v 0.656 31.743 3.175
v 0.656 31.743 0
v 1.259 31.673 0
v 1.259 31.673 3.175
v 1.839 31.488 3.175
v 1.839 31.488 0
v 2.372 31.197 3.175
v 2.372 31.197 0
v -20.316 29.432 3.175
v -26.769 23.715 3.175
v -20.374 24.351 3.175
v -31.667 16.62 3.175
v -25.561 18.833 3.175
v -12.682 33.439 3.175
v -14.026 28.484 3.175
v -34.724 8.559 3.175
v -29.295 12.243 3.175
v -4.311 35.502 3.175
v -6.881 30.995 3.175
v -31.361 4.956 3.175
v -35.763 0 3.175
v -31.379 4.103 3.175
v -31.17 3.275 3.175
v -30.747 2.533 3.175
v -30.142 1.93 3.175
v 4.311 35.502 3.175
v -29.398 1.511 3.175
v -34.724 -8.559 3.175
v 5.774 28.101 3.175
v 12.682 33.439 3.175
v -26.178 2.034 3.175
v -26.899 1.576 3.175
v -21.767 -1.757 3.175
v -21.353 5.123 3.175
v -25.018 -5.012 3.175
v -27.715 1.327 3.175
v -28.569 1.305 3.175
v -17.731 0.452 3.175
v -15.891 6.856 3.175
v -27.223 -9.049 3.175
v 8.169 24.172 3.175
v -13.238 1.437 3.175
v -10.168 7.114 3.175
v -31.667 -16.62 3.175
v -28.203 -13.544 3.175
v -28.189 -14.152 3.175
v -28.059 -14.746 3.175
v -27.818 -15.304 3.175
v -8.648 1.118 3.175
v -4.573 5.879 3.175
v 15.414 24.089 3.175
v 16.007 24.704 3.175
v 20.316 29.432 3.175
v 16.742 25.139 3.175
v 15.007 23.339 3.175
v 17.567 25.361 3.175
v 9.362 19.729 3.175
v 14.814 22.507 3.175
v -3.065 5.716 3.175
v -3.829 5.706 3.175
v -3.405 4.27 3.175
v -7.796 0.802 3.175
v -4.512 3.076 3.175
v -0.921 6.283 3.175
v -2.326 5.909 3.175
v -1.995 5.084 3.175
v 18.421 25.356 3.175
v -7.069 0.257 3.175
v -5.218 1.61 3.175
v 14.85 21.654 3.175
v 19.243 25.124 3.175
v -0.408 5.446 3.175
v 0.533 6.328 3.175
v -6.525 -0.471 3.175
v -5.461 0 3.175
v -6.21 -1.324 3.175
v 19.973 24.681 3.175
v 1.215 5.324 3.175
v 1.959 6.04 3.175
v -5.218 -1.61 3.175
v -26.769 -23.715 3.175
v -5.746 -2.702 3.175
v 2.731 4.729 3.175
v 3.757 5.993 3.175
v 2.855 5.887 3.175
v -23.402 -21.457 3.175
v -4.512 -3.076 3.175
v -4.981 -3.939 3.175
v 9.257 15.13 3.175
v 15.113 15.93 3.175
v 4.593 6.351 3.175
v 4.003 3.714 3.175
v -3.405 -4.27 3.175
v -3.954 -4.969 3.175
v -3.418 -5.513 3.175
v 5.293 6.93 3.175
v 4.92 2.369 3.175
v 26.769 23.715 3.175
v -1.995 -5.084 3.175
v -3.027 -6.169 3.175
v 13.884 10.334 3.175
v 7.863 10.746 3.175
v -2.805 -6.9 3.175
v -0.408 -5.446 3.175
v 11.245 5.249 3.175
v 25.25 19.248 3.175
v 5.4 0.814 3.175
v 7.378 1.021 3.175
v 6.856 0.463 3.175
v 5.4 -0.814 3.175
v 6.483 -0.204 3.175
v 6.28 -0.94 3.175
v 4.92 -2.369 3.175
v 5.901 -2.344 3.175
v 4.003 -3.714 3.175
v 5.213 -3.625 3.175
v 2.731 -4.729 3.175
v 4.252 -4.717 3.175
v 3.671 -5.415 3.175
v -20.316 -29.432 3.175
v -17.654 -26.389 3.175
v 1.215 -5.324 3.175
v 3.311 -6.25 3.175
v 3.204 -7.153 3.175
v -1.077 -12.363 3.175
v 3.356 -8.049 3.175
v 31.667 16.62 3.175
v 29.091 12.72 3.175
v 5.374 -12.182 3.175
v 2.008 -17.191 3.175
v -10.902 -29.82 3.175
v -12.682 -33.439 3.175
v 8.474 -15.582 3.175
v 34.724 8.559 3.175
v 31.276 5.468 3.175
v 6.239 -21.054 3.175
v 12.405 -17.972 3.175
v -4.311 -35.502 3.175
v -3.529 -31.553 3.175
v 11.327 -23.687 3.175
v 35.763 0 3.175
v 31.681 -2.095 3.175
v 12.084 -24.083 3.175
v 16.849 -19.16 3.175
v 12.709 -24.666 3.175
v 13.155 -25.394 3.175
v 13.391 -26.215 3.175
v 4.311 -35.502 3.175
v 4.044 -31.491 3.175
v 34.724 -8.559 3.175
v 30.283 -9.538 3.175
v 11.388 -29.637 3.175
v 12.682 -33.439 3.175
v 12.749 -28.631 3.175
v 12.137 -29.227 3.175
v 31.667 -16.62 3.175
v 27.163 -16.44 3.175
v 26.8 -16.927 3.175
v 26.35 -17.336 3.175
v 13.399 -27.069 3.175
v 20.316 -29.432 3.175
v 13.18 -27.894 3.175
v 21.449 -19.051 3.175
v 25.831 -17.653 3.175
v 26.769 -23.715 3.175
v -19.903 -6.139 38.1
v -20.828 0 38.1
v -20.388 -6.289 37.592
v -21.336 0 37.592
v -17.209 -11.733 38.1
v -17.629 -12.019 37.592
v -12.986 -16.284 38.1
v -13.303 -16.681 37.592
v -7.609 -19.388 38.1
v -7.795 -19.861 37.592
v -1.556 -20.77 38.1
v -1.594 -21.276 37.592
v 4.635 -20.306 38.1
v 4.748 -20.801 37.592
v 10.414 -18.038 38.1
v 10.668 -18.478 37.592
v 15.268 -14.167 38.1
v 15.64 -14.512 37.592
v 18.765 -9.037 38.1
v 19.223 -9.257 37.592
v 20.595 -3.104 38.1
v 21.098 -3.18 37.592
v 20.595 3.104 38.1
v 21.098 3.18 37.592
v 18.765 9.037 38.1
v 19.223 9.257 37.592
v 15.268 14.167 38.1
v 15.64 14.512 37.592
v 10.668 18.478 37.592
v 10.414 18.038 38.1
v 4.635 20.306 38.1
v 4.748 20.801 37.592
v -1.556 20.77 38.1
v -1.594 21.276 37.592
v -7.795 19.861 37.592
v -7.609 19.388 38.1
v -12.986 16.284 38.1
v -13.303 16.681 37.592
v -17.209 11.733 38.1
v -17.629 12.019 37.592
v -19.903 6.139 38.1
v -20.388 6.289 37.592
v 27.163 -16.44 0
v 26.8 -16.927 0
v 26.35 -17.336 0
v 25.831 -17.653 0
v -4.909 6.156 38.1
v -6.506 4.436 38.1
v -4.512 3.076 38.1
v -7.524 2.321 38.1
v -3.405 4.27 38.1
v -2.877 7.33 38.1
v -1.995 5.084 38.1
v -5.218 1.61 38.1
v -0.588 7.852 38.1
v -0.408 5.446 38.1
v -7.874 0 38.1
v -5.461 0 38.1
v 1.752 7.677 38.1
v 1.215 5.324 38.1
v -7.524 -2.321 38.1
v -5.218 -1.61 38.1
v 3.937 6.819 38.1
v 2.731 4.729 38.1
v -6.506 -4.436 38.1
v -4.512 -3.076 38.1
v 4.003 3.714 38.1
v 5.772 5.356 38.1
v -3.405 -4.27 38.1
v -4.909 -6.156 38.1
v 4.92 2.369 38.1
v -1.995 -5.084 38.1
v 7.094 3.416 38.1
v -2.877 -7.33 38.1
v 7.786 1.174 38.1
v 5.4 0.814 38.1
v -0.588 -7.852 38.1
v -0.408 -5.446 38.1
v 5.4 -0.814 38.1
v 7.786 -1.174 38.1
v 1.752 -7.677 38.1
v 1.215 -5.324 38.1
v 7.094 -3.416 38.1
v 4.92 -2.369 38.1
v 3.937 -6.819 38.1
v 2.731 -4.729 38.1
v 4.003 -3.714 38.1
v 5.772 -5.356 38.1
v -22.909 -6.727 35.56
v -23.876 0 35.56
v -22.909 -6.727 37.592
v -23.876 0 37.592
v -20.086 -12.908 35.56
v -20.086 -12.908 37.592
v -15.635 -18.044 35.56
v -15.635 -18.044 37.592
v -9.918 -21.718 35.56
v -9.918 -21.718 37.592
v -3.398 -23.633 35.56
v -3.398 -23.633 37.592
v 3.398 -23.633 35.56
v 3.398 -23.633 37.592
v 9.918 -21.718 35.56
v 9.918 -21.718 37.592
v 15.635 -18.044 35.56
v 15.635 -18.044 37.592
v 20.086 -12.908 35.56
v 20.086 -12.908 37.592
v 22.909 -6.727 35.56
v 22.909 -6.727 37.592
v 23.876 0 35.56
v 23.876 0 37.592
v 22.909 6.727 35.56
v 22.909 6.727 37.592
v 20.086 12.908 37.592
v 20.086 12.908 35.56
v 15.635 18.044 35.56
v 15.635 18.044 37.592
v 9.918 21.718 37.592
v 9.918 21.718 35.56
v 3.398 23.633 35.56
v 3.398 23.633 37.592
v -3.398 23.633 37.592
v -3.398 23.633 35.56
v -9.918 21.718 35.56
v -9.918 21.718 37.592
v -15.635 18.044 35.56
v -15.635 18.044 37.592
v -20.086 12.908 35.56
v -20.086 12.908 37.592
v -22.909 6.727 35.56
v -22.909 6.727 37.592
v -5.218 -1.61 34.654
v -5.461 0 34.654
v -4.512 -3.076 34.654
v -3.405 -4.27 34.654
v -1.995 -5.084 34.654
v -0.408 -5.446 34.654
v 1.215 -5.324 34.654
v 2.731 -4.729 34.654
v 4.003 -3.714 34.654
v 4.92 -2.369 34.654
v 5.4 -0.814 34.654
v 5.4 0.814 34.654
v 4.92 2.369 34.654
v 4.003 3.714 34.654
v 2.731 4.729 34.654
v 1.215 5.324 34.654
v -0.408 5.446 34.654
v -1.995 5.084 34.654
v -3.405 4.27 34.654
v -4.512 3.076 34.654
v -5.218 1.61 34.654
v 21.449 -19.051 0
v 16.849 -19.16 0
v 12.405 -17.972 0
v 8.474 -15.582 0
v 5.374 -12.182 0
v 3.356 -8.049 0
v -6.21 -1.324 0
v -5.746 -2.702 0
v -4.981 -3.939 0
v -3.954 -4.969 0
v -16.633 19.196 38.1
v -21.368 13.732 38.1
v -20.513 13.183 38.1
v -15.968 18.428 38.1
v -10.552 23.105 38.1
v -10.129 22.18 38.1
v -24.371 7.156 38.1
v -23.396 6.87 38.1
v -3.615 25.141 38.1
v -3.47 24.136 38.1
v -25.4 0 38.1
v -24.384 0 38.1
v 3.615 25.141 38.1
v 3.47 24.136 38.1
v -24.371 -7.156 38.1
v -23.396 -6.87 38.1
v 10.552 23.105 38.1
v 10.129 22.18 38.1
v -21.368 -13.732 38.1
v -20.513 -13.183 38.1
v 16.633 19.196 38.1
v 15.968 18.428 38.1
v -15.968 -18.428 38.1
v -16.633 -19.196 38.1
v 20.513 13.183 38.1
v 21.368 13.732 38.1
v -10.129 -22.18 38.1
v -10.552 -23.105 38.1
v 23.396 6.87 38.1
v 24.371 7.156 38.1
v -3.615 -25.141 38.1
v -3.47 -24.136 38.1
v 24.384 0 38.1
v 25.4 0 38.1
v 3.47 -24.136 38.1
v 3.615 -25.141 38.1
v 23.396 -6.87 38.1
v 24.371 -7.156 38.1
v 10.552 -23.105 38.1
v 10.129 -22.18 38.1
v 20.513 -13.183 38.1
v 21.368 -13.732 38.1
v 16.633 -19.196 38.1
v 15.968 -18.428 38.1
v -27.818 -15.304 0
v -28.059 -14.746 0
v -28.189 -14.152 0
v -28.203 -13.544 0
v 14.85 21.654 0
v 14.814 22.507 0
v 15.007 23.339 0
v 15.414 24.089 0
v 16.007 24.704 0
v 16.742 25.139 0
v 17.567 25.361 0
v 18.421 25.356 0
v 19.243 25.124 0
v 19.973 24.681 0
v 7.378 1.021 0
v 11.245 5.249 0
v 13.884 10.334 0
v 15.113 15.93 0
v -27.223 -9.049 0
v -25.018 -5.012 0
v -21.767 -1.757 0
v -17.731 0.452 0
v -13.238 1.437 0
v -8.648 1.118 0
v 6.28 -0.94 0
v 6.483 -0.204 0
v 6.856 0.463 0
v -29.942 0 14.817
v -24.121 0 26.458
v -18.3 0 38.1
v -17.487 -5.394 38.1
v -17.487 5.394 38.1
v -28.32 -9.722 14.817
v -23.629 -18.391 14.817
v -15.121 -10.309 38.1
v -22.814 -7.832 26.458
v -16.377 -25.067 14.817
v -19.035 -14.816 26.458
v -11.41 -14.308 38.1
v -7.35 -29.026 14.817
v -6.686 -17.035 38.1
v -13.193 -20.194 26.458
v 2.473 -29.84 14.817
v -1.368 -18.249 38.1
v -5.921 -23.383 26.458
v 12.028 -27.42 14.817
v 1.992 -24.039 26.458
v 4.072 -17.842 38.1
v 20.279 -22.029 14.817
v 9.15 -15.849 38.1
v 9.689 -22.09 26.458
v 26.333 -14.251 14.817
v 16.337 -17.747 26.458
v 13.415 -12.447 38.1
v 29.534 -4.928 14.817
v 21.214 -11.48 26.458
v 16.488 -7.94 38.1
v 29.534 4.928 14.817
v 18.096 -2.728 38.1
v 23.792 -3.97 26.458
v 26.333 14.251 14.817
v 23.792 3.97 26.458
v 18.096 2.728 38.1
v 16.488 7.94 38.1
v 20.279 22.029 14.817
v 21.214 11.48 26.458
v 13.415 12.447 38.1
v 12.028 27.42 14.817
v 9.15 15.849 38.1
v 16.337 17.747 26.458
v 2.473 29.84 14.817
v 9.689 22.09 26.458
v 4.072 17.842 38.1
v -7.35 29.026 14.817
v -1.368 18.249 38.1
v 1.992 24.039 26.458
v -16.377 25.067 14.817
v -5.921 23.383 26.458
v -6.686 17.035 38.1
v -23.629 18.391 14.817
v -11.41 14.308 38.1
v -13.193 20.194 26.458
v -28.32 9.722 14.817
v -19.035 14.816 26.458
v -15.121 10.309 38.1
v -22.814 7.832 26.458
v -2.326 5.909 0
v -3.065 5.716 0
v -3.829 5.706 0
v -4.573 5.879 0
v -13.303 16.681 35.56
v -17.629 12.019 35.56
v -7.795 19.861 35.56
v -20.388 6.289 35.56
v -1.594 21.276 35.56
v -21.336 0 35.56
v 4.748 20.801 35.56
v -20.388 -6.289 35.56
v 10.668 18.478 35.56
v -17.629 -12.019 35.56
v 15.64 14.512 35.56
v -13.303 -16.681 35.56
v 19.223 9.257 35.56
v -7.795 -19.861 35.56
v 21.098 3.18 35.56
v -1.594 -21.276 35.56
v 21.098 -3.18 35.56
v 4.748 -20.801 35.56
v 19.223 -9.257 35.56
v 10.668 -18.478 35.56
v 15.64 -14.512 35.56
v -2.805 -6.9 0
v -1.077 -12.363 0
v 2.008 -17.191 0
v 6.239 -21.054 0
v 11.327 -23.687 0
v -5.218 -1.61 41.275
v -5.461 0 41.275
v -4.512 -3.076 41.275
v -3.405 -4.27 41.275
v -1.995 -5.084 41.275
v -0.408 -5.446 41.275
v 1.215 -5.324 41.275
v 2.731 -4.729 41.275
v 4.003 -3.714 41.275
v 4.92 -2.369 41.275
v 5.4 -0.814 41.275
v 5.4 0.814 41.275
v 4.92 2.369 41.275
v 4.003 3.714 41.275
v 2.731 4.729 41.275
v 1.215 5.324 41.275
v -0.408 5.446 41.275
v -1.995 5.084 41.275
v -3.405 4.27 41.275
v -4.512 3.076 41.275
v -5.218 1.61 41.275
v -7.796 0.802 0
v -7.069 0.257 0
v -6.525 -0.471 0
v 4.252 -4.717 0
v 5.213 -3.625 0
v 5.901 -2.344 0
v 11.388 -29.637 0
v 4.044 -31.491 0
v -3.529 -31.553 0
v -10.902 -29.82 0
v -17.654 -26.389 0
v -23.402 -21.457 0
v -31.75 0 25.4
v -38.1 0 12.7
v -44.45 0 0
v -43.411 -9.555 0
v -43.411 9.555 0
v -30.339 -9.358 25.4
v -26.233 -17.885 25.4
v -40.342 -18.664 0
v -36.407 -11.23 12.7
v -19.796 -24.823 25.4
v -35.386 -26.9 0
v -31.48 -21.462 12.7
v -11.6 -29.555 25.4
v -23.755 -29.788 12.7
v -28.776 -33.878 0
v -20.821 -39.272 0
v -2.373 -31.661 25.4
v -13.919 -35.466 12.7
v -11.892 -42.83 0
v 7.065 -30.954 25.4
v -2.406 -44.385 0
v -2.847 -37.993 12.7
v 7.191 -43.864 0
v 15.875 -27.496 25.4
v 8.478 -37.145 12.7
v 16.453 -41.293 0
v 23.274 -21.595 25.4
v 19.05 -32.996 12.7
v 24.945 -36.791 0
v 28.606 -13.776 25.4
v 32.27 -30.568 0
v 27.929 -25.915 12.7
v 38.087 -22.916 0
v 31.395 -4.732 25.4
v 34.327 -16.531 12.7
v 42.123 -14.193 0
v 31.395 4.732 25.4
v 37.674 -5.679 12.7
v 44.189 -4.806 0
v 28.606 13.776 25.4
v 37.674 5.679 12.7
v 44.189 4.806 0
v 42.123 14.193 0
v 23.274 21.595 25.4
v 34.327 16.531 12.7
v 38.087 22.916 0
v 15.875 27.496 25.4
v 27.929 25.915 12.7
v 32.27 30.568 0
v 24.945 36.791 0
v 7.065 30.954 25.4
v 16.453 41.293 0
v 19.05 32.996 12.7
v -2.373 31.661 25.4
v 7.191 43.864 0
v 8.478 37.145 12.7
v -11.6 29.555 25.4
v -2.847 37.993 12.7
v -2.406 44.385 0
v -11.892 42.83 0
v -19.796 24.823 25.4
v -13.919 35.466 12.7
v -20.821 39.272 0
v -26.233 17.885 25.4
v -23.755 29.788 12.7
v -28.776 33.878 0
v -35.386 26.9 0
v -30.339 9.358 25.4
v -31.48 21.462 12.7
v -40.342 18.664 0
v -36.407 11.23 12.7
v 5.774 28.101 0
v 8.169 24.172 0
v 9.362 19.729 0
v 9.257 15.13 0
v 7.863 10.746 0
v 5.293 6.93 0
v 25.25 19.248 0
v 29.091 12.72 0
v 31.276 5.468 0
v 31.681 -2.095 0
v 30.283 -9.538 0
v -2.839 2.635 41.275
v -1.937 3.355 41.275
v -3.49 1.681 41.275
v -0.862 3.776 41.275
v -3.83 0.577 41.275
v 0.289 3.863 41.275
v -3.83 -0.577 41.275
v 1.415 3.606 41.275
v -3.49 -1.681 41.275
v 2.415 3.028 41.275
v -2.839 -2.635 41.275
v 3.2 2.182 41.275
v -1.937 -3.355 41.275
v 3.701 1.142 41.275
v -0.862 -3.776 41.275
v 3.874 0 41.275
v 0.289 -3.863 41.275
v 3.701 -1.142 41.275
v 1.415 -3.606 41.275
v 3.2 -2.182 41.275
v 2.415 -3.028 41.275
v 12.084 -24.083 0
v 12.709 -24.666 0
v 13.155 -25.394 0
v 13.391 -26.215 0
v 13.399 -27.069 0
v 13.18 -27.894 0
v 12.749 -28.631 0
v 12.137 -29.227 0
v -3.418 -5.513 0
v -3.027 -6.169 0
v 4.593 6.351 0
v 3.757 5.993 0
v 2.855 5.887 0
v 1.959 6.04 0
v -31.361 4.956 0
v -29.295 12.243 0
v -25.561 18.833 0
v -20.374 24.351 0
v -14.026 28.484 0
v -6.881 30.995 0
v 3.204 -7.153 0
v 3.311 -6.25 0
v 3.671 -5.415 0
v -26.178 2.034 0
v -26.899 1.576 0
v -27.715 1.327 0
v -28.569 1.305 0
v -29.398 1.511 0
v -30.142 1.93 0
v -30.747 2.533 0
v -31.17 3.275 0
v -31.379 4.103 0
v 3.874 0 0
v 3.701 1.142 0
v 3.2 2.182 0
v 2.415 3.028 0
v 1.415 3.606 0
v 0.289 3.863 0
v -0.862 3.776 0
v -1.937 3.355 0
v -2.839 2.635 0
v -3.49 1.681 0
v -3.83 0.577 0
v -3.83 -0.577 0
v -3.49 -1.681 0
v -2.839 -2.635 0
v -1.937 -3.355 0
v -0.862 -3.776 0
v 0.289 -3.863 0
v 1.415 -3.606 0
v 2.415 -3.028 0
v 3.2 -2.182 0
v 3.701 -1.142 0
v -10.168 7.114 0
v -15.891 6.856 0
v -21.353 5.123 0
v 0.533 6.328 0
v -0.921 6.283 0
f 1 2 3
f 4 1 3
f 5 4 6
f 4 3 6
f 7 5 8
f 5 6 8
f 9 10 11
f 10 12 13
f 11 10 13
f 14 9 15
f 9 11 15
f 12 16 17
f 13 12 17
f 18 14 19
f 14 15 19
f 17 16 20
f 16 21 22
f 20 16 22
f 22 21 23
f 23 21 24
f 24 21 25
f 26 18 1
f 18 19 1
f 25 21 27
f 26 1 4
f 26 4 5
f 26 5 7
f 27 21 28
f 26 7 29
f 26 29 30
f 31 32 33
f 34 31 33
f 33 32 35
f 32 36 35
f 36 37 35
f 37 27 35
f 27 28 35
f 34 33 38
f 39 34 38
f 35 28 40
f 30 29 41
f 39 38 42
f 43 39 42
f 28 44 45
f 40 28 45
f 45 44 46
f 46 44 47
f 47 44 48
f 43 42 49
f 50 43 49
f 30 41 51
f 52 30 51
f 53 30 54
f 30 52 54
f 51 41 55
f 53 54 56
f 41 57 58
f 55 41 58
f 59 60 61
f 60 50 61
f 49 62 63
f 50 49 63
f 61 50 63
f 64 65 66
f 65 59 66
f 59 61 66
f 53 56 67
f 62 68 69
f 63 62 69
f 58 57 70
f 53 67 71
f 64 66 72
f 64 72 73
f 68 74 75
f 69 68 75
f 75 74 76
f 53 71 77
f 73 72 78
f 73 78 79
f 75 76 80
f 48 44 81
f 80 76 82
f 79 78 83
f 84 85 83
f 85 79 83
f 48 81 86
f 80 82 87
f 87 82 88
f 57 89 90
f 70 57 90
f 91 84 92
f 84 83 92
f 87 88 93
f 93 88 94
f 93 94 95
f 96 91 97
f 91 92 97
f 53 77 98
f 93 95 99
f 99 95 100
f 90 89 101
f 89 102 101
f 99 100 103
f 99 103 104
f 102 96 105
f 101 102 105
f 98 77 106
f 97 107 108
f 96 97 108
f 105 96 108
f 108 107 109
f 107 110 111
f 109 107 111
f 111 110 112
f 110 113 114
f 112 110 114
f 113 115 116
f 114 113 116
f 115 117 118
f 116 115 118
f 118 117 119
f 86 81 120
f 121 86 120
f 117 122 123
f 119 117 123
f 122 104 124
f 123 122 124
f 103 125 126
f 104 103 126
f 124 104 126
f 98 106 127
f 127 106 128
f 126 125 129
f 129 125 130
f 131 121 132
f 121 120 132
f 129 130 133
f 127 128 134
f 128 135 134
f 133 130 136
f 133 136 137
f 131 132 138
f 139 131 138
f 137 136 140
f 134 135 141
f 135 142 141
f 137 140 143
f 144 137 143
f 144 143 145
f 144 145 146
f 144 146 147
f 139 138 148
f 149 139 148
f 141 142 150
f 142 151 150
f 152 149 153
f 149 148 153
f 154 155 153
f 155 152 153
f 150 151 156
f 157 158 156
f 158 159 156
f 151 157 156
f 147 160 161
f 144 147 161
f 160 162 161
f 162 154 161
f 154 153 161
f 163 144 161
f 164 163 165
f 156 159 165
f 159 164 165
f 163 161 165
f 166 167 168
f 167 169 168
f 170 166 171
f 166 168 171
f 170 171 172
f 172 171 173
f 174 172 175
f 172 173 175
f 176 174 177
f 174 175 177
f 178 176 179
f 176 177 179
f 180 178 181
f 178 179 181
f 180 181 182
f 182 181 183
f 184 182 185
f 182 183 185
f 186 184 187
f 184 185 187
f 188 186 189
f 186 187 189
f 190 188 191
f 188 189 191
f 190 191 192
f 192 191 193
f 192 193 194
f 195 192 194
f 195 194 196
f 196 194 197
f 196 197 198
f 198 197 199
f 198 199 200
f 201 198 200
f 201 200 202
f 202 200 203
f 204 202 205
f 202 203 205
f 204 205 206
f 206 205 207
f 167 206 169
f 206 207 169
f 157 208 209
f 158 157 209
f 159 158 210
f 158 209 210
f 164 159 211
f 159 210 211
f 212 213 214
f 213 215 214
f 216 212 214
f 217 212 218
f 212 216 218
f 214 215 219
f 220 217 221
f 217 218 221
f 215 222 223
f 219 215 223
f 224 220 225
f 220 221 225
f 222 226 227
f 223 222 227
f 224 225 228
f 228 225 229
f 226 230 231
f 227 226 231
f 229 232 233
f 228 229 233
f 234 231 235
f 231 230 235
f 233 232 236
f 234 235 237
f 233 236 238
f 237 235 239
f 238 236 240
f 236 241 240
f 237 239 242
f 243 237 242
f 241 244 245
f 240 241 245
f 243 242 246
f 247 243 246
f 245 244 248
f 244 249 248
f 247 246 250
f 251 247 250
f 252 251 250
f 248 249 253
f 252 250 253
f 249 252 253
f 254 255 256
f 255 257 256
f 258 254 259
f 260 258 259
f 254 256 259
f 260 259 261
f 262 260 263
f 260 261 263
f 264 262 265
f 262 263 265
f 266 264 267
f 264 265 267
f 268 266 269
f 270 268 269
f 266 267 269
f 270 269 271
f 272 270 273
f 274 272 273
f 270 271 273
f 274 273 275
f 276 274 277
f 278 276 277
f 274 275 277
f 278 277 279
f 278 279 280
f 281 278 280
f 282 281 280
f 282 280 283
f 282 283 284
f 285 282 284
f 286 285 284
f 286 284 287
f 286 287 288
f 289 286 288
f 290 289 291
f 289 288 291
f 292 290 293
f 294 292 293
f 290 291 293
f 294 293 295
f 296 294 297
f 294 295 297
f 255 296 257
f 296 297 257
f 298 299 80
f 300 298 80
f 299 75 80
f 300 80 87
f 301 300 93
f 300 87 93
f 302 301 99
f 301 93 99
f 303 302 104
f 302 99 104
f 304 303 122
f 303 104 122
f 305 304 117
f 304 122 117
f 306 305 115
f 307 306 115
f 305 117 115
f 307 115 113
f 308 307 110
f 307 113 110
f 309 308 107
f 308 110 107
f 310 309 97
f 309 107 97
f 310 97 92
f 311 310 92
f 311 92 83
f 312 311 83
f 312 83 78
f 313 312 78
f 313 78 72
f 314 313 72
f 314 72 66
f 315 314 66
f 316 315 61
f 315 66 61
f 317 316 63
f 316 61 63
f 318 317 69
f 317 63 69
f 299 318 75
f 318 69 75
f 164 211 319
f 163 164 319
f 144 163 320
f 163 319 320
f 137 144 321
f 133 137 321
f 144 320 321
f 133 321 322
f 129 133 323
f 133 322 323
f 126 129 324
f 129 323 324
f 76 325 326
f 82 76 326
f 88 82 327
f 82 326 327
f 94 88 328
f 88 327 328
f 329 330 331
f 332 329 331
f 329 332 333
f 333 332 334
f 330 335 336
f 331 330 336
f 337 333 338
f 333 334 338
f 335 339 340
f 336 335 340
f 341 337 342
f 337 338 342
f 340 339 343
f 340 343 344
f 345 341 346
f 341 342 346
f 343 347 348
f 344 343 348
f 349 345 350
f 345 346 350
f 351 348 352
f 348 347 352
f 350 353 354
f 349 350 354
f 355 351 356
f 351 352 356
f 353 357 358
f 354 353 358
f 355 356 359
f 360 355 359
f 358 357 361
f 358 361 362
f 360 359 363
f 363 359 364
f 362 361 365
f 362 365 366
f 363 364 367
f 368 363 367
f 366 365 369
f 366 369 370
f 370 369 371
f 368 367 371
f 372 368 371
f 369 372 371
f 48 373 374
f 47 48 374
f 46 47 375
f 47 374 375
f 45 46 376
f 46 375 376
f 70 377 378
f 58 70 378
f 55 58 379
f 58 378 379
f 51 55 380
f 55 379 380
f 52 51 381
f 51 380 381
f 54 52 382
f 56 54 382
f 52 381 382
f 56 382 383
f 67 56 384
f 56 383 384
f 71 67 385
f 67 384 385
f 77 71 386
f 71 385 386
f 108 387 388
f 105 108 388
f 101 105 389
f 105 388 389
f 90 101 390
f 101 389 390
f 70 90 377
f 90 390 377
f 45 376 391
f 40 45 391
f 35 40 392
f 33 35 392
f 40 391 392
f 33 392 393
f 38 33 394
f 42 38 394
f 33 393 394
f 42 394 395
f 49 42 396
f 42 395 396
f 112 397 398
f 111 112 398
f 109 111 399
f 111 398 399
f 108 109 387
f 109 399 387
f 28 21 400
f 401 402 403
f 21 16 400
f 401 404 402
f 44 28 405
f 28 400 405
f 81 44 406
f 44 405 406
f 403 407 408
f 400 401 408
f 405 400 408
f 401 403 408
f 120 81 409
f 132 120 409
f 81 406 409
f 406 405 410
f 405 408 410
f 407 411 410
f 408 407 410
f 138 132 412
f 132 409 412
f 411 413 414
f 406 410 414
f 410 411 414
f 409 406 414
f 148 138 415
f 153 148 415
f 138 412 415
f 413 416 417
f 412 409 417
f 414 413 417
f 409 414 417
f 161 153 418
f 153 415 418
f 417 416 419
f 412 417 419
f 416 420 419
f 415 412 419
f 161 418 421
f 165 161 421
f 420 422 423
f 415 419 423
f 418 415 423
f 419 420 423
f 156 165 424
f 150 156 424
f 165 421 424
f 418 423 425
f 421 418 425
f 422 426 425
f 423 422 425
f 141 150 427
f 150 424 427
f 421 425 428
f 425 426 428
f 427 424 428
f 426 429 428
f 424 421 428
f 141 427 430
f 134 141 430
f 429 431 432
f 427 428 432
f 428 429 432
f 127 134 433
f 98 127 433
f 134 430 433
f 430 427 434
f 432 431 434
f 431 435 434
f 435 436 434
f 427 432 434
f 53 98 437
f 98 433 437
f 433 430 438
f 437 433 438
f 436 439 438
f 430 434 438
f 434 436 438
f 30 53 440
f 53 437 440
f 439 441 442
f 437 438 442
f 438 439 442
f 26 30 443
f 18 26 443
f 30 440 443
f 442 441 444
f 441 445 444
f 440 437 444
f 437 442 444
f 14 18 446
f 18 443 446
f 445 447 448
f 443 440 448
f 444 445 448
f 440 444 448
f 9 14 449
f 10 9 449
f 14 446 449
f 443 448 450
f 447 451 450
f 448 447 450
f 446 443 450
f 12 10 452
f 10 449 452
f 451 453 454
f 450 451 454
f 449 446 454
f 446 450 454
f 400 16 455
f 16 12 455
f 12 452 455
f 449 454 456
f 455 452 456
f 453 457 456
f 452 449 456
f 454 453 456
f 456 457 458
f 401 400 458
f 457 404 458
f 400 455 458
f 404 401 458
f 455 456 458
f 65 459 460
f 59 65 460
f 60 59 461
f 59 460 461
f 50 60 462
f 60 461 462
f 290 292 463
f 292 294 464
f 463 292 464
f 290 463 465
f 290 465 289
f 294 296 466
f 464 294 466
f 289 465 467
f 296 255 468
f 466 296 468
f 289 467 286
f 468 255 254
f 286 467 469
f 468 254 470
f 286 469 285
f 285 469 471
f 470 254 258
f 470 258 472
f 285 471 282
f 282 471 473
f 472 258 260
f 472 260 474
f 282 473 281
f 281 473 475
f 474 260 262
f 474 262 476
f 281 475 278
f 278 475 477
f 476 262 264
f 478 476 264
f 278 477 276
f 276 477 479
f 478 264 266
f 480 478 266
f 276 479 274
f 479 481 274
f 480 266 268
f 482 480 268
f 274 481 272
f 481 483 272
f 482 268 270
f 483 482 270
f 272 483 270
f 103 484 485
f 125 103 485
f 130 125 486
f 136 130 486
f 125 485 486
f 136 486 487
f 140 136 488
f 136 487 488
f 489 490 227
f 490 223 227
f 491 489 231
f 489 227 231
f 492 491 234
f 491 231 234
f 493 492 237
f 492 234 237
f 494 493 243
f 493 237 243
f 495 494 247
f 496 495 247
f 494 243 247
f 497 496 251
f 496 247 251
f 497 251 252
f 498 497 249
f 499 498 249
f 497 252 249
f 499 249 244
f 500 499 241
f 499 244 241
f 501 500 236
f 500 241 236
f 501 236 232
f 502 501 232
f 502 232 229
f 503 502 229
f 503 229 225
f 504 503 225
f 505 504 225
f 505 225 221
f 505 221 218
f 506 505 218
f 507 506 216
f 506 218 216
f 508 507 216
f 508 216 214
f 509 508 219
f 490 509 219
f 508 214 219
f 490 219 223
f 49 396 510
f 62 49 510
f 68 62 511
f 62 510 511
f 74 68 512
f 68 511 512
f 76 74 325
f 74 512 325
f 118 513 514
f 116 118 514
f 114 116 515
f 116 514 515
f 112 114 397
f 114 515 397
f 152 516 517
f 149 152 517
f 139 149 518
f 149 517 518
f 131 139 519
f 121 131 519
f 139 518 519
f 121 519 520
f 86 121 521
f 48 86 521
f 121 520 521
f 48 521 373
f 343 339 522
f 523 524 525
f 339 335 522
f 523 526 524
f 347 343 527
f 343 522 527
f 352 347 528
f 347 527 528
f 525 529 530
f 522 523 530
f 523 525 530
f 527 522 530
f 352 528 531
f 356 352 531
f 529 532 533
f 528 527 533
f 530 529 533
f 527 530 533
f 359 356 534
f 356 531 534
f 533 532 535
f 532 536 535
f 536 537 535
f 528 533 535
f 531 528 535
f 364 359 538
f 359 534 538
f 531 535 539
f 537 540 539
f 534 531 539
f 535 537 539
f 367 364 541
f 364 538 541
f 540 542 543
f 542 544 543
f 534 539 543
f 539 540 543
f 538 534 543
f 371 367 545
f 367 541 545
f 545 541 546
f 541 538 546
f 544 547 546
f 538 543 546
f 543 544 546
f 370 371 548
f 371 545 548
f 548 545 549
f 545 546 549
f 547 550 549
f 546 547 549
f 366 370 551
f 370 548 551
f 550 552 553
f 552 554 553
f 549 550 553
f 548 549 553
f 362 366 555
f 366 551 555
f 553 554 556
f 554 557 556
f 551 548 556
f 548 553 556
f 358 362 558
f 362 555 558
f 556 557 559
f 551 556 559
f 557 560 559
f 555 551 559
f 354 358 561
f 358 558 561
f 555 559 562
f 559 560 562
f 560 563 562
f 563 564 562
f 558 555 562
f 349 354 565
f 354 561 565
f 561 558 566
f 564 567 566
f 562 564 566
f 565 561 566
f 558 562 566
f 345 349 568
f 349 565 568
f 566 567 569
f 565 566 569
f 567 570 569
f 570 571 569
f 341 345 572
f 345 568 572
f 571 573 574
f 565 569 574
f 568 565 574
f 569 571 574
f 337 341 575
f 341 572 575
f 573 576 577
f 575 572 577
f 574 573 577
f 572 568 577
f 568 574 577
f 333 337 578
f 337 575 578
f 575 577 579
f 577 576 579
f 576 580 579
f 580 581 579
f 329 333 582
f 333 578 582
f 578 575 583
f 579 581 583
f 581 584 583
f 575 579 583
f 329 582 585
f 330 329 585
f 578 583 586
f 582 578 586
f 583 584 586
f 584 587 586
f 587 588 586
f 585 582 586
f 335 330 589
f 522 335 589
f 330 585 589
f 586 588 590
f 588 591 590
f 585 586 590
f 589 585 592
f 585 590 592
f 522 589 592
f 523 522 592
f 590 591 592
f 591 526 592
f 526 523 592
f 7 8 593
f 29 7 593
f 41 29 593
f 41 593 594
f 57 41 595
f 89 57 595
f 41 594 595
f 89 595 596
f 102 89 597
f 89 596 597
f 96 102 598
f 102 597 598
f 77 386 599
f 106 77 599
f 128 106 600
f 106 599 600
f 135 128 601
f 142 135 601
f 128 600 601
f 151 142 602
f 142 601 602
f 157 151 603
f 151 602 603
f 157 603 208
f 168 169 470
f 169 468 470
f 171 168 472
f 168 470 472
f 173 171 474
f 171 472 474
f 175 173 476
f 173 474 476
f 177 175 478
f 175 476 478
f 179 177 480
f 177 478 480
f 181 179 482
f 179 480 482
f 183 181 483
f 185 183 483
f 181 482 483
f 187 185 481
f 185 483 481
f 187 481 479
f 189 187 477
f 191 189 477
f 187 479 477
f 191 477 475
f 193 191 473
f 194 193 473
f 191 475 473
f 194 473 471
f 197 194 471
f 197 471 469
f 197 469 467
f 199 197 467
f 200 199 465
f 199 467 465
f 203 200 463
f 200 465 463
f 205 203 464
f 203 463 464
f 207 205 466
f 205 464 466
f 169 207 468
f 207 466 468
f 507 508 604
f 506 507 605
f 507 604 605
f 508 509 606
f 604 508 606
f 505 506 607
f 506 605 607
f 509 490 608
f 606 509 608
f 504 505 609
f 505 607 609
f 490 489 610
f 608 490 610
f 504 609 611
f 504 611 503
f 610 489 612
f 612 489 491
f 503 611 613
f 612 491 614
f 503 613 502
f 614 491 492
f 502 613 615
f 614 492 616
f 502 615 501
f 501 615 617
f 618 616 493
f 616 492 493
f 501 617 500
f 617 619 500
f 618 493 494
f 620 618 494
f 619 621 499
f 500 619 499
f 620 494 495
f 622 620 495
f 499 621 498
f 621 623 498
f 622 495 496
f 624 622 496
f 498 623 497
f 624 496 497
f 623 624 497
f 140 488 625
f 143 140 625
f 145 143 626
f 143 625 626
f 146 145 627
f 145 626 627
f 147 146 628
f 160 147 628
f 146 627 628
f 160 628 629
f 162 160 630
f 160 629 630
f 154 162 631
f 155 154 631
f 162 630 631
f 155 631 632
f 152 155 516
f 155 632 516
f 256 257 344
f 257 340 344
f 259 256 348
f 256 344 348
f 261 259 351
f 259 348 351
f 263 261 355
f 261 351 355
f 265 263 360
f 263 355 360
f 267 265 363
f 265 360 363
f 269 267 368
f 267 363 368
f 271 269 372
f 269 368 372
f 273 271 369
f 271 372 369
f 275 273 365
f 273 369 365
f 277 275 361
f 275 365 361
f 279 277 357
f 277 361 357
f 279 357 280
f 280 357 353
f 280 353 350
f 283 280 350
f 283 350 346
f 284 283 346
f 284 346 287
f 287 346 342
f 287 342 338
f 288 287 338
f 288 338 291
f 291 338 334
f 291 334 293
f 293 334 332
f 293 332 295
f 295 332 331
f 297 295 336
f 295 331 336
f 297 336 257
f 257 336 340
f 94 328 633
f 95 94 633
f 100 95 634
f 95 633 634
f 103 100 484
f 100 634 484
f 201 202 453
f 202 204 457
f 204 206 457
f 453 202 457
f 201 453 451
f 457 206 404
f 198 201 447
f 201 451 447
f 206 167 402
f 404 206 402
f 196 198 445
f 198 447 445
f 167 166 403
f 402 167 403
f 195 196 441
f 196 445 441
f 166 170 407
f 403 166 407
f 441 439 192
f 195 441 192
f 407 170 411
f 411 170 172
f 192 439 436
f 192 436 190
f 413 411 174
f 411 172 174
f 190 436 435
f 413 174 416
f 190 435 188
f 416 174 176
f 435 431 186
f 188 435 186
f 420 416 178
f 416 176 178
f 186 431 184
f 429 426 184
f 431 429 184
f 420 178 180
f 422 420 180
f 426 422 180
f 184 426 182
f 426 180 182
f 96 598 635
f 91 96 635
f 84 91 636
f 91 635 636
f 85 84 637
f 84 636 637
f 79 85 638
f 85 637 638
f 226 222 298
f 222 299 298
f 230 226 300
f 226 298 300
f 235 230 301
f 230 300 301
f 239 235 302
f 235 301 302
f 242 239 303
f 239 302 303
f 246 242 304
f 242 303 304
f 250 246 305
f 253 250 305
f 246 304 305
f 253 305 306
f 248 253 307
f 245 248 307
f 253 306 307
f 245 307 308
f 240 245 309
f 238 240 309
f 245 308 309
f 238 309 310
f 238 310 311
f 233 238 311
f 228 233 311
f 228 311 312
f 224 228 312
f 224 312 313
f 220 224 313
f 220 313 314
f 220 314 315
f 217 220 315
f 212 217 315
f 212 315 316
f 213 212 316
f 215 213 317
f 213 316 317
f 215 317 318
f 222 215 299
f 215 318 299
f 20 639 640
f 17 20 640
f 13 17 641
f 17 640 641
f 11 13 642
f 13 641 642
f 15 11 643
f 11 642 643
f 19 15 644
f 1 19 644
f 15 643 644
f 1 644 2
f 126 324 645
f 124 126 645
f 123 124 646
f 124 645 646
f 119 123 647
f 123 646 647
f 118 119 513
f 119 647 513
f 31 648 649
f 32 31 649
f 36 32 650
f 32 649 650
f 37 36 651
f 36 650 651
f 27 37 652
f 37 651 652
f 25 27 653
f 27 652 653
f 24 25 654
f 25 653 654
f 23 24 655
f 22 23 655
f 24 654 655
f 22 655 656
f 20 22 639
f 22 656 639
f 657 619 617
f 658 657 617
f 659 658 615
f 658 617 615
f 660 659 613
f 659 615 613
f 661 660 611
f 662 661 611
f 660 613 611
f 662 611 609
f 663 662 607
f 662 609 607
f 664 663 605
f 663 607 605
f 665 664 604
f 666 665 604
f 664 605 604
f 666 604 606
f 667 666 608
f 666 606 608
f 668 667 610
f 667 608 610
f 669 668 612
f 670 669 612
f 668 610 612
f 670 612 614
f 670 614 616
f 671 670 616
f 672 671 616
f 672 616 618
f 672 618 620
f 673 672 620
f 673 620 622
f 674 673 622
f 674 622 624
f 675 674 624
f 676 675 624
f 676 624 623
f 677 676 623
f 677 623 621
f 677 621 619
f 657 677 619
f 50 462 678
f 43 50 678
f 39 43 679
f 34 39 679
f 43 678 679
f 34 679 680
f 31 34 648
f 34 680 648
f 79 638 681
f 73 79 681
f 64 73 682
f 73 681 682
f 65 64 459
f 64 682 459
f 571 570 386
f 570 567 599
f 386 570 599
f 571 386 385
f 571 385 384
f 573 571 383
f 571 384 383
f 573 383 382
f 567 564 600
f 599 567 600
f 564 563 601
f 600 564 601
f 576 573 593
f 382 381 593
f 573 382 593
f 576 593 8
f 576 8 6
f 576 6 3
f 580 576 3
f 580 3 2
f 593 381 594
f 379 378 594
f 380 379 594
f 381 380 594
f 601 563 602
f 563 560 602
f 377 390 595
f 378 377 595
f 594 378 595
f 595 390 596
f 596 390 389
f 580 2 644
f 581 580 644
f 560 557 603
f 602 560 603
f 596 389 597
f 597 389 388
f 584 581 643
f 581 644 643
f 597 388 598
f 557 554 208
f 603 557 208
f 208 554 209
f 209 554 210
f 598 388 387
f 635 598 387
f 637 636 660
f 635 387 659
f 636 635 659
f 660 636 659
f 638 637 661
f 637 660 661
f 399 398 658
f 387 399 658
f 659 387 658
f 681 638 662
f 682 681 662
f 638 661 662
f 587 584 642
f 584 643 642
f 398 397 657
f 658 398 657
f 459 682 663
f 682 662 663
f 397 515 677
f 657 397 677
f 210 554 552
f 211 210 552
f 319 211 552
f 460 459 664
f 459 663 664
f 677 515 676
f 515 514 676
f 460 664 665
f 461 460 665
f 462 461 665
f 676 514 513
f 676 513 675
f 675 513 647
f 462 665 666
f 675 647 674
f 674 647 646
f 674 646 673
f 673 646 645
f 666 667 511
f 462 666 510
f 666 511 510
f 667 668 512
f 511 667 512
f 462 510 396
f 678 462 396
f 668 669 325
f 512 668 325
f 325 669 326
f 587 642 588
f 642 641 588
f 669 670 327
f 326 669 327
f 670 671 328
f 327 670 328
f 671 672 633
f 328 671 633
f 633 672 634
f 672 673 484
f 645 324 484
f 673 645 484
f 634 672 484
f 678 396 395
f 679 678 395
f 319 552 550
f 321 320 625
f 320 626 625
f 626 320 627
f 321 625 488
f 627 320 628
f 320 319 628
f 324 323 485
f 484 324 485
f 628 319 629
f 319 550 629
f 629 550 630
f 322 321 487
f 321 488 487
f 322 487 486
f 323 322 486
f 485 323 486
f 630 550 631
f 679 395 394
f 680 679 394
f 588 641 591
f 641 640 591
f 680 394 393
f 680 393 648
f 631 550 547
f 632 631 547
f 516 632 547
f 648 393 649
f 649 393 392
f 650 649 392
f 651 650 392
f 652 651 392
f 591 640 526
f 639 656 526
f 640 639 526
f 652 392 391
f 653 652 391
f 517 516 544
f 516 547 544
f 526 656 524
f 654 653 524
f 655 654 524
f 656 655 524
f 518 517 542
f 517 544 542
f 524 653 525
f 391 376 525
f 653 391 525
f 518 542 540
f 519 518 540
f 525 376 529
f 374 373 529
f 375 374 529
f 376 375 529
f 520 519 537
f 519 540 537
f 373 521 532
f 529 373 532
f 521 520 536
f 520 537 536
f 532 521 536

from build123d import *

# Parameters (mm, degrees)
F2_R     = 3.8735
F3_DEPTH = 41.276
F5_DEPTH = 3.175


with BuildPart() as f1:
    # F0 (on Front) → F1 (revolve)
    with BuildSketch(Plane.XZ):
        Polygon((-24.384, 38.1), (-25.4, 38.1), (-44.45, 0), (0, 0), (0, 41.275), (-5.461, 41.275), (-5.461, 38.1), (-7.874, 38.1), (-5.461, 34.653879), (-5.461, 3.175), (-35.762984, 3.175), (-18.300484, 38.1), (-20.828, 38.1), (-21.336, 37.592), (-21.336, 35.56), (-23.876, 35.56), (-23.876, 37.592), align=None)
    revolve(axis=Axis((0, 0, 21.25227), (0, 0, 1)))

    # F2 (on face) → F3 (cut, through all)
    with BuildSketch(Plane.XY.offset(41.275)):
        Circle(F2_R)
    extrude(amount=-F3_DEPTH, mode=Mode.SUBTRACT)

    # F4 (on face) → F5 (cut)
    with BuildSketch(Plane(origin=(0, 0, 0), x_dir=(1, 0, 0), z_dir=(0, 0, -1))):
        with BuildLine():
            ThreePointArc((-6.210474, 1.323825), (-5.399143, 3.342418), (-3.954071, 4.968684))
            ThreePointArc((-3.954071, 4.968684), (-3.20282, 5.829119), (-2.804688, 6.899734))
            ThreePointArc((-2.804688, 6.899734), (2.007902, 17.190565), (11.32741, 23.687409))
            ThreePointArc((11.32741, 23.687409), (13.423957, 26.641414), (11.387913, 29.637442))
            ThreePointArc((11.387913, 29.637442), (-10.902012, 29.819601), (-27.818336, 15.303682))
            ThreePointArc((-27.818336, 15.303682), (-28.138147, 14.451862), (-28.203233, 13.544315))
            ThreePointArc((-28.203233, 13.544315), (-21.766814, 1.757015), (-8.648102, -1.11828))
            ThreePointArc((-8.648102, -1.11828), (-7.068588, -0.257266), (-6.210474, 1.323825))
        make_face()
        with BuildLine():
            ThreePointArc((1.958771, -6.040341), (-0.195047, -6.347004), (-2.325971, -5.908668))
            ThreePointArc((-2.325971, -5.908668), (-3.446755, -5.688283), (-4.573001, -5.878798))
            ThreePointArc((-4.573001, -5.878798), (-15.891416, -6.856388), (-26.177603, -2.03388))
            ThreePointArc((-26.177603, -2.03388), (-29.78412, -1.695219), (-31.360734, -4.956499))
            ThreePointArc((-31.360734, -4.956499), (-20.373526, -24.35122), (0.655791, -31.743227))
            ThreePointArc((0.655791, -31.743227), (1.553394, -31.594281), (2.371896, -31.196874))
            ThreePointArc((2.371896, -31.196874), (9.361787, -19.729122), (5.29251, -6.930337))
            ThreePointArc((5.29251, -6.930337), (3.757093, -5.992944), (1.958771, -6.040341))
        make_face()
        with BuildLine():
            ThreePointArc((4.251703, 4.716516), (5.59419, 3.004586), (6.280042, 0.939984))
            ThreePointArc((6.280042, 0.939984), (6.649575, -0.140836), (7.377689, -1.020936))
            ThreePointArc((7.377689, -1.020936), (13.883515, -10.334176), (14.850193, -21.653529))
            ThreePointArc((14.850193, -21.653529), (16.360163, -24.946195), (19.972821, -24.680942))
            ThreePointArc((19.972821, -24.680942), (31.275538, -5.468381), (27.162545, 16.439545))
            ThreePointArc((27.162545, 16.439545), (26.584753, 17.142419), (25.831337, 17.652559))
            ThreePointArc((25.831337, 17.652559), (12.405027, 17.972106), (3.355593, 8.048616))
            ThreePointArc((3.355593, 8.048616), (3.311495, 6.25021), (4.251703, 4.716516))
        make_face()
    extrude(amount=-F5_DEPTH, mode=Mode.SUBTRACT)


solid = f1.part
